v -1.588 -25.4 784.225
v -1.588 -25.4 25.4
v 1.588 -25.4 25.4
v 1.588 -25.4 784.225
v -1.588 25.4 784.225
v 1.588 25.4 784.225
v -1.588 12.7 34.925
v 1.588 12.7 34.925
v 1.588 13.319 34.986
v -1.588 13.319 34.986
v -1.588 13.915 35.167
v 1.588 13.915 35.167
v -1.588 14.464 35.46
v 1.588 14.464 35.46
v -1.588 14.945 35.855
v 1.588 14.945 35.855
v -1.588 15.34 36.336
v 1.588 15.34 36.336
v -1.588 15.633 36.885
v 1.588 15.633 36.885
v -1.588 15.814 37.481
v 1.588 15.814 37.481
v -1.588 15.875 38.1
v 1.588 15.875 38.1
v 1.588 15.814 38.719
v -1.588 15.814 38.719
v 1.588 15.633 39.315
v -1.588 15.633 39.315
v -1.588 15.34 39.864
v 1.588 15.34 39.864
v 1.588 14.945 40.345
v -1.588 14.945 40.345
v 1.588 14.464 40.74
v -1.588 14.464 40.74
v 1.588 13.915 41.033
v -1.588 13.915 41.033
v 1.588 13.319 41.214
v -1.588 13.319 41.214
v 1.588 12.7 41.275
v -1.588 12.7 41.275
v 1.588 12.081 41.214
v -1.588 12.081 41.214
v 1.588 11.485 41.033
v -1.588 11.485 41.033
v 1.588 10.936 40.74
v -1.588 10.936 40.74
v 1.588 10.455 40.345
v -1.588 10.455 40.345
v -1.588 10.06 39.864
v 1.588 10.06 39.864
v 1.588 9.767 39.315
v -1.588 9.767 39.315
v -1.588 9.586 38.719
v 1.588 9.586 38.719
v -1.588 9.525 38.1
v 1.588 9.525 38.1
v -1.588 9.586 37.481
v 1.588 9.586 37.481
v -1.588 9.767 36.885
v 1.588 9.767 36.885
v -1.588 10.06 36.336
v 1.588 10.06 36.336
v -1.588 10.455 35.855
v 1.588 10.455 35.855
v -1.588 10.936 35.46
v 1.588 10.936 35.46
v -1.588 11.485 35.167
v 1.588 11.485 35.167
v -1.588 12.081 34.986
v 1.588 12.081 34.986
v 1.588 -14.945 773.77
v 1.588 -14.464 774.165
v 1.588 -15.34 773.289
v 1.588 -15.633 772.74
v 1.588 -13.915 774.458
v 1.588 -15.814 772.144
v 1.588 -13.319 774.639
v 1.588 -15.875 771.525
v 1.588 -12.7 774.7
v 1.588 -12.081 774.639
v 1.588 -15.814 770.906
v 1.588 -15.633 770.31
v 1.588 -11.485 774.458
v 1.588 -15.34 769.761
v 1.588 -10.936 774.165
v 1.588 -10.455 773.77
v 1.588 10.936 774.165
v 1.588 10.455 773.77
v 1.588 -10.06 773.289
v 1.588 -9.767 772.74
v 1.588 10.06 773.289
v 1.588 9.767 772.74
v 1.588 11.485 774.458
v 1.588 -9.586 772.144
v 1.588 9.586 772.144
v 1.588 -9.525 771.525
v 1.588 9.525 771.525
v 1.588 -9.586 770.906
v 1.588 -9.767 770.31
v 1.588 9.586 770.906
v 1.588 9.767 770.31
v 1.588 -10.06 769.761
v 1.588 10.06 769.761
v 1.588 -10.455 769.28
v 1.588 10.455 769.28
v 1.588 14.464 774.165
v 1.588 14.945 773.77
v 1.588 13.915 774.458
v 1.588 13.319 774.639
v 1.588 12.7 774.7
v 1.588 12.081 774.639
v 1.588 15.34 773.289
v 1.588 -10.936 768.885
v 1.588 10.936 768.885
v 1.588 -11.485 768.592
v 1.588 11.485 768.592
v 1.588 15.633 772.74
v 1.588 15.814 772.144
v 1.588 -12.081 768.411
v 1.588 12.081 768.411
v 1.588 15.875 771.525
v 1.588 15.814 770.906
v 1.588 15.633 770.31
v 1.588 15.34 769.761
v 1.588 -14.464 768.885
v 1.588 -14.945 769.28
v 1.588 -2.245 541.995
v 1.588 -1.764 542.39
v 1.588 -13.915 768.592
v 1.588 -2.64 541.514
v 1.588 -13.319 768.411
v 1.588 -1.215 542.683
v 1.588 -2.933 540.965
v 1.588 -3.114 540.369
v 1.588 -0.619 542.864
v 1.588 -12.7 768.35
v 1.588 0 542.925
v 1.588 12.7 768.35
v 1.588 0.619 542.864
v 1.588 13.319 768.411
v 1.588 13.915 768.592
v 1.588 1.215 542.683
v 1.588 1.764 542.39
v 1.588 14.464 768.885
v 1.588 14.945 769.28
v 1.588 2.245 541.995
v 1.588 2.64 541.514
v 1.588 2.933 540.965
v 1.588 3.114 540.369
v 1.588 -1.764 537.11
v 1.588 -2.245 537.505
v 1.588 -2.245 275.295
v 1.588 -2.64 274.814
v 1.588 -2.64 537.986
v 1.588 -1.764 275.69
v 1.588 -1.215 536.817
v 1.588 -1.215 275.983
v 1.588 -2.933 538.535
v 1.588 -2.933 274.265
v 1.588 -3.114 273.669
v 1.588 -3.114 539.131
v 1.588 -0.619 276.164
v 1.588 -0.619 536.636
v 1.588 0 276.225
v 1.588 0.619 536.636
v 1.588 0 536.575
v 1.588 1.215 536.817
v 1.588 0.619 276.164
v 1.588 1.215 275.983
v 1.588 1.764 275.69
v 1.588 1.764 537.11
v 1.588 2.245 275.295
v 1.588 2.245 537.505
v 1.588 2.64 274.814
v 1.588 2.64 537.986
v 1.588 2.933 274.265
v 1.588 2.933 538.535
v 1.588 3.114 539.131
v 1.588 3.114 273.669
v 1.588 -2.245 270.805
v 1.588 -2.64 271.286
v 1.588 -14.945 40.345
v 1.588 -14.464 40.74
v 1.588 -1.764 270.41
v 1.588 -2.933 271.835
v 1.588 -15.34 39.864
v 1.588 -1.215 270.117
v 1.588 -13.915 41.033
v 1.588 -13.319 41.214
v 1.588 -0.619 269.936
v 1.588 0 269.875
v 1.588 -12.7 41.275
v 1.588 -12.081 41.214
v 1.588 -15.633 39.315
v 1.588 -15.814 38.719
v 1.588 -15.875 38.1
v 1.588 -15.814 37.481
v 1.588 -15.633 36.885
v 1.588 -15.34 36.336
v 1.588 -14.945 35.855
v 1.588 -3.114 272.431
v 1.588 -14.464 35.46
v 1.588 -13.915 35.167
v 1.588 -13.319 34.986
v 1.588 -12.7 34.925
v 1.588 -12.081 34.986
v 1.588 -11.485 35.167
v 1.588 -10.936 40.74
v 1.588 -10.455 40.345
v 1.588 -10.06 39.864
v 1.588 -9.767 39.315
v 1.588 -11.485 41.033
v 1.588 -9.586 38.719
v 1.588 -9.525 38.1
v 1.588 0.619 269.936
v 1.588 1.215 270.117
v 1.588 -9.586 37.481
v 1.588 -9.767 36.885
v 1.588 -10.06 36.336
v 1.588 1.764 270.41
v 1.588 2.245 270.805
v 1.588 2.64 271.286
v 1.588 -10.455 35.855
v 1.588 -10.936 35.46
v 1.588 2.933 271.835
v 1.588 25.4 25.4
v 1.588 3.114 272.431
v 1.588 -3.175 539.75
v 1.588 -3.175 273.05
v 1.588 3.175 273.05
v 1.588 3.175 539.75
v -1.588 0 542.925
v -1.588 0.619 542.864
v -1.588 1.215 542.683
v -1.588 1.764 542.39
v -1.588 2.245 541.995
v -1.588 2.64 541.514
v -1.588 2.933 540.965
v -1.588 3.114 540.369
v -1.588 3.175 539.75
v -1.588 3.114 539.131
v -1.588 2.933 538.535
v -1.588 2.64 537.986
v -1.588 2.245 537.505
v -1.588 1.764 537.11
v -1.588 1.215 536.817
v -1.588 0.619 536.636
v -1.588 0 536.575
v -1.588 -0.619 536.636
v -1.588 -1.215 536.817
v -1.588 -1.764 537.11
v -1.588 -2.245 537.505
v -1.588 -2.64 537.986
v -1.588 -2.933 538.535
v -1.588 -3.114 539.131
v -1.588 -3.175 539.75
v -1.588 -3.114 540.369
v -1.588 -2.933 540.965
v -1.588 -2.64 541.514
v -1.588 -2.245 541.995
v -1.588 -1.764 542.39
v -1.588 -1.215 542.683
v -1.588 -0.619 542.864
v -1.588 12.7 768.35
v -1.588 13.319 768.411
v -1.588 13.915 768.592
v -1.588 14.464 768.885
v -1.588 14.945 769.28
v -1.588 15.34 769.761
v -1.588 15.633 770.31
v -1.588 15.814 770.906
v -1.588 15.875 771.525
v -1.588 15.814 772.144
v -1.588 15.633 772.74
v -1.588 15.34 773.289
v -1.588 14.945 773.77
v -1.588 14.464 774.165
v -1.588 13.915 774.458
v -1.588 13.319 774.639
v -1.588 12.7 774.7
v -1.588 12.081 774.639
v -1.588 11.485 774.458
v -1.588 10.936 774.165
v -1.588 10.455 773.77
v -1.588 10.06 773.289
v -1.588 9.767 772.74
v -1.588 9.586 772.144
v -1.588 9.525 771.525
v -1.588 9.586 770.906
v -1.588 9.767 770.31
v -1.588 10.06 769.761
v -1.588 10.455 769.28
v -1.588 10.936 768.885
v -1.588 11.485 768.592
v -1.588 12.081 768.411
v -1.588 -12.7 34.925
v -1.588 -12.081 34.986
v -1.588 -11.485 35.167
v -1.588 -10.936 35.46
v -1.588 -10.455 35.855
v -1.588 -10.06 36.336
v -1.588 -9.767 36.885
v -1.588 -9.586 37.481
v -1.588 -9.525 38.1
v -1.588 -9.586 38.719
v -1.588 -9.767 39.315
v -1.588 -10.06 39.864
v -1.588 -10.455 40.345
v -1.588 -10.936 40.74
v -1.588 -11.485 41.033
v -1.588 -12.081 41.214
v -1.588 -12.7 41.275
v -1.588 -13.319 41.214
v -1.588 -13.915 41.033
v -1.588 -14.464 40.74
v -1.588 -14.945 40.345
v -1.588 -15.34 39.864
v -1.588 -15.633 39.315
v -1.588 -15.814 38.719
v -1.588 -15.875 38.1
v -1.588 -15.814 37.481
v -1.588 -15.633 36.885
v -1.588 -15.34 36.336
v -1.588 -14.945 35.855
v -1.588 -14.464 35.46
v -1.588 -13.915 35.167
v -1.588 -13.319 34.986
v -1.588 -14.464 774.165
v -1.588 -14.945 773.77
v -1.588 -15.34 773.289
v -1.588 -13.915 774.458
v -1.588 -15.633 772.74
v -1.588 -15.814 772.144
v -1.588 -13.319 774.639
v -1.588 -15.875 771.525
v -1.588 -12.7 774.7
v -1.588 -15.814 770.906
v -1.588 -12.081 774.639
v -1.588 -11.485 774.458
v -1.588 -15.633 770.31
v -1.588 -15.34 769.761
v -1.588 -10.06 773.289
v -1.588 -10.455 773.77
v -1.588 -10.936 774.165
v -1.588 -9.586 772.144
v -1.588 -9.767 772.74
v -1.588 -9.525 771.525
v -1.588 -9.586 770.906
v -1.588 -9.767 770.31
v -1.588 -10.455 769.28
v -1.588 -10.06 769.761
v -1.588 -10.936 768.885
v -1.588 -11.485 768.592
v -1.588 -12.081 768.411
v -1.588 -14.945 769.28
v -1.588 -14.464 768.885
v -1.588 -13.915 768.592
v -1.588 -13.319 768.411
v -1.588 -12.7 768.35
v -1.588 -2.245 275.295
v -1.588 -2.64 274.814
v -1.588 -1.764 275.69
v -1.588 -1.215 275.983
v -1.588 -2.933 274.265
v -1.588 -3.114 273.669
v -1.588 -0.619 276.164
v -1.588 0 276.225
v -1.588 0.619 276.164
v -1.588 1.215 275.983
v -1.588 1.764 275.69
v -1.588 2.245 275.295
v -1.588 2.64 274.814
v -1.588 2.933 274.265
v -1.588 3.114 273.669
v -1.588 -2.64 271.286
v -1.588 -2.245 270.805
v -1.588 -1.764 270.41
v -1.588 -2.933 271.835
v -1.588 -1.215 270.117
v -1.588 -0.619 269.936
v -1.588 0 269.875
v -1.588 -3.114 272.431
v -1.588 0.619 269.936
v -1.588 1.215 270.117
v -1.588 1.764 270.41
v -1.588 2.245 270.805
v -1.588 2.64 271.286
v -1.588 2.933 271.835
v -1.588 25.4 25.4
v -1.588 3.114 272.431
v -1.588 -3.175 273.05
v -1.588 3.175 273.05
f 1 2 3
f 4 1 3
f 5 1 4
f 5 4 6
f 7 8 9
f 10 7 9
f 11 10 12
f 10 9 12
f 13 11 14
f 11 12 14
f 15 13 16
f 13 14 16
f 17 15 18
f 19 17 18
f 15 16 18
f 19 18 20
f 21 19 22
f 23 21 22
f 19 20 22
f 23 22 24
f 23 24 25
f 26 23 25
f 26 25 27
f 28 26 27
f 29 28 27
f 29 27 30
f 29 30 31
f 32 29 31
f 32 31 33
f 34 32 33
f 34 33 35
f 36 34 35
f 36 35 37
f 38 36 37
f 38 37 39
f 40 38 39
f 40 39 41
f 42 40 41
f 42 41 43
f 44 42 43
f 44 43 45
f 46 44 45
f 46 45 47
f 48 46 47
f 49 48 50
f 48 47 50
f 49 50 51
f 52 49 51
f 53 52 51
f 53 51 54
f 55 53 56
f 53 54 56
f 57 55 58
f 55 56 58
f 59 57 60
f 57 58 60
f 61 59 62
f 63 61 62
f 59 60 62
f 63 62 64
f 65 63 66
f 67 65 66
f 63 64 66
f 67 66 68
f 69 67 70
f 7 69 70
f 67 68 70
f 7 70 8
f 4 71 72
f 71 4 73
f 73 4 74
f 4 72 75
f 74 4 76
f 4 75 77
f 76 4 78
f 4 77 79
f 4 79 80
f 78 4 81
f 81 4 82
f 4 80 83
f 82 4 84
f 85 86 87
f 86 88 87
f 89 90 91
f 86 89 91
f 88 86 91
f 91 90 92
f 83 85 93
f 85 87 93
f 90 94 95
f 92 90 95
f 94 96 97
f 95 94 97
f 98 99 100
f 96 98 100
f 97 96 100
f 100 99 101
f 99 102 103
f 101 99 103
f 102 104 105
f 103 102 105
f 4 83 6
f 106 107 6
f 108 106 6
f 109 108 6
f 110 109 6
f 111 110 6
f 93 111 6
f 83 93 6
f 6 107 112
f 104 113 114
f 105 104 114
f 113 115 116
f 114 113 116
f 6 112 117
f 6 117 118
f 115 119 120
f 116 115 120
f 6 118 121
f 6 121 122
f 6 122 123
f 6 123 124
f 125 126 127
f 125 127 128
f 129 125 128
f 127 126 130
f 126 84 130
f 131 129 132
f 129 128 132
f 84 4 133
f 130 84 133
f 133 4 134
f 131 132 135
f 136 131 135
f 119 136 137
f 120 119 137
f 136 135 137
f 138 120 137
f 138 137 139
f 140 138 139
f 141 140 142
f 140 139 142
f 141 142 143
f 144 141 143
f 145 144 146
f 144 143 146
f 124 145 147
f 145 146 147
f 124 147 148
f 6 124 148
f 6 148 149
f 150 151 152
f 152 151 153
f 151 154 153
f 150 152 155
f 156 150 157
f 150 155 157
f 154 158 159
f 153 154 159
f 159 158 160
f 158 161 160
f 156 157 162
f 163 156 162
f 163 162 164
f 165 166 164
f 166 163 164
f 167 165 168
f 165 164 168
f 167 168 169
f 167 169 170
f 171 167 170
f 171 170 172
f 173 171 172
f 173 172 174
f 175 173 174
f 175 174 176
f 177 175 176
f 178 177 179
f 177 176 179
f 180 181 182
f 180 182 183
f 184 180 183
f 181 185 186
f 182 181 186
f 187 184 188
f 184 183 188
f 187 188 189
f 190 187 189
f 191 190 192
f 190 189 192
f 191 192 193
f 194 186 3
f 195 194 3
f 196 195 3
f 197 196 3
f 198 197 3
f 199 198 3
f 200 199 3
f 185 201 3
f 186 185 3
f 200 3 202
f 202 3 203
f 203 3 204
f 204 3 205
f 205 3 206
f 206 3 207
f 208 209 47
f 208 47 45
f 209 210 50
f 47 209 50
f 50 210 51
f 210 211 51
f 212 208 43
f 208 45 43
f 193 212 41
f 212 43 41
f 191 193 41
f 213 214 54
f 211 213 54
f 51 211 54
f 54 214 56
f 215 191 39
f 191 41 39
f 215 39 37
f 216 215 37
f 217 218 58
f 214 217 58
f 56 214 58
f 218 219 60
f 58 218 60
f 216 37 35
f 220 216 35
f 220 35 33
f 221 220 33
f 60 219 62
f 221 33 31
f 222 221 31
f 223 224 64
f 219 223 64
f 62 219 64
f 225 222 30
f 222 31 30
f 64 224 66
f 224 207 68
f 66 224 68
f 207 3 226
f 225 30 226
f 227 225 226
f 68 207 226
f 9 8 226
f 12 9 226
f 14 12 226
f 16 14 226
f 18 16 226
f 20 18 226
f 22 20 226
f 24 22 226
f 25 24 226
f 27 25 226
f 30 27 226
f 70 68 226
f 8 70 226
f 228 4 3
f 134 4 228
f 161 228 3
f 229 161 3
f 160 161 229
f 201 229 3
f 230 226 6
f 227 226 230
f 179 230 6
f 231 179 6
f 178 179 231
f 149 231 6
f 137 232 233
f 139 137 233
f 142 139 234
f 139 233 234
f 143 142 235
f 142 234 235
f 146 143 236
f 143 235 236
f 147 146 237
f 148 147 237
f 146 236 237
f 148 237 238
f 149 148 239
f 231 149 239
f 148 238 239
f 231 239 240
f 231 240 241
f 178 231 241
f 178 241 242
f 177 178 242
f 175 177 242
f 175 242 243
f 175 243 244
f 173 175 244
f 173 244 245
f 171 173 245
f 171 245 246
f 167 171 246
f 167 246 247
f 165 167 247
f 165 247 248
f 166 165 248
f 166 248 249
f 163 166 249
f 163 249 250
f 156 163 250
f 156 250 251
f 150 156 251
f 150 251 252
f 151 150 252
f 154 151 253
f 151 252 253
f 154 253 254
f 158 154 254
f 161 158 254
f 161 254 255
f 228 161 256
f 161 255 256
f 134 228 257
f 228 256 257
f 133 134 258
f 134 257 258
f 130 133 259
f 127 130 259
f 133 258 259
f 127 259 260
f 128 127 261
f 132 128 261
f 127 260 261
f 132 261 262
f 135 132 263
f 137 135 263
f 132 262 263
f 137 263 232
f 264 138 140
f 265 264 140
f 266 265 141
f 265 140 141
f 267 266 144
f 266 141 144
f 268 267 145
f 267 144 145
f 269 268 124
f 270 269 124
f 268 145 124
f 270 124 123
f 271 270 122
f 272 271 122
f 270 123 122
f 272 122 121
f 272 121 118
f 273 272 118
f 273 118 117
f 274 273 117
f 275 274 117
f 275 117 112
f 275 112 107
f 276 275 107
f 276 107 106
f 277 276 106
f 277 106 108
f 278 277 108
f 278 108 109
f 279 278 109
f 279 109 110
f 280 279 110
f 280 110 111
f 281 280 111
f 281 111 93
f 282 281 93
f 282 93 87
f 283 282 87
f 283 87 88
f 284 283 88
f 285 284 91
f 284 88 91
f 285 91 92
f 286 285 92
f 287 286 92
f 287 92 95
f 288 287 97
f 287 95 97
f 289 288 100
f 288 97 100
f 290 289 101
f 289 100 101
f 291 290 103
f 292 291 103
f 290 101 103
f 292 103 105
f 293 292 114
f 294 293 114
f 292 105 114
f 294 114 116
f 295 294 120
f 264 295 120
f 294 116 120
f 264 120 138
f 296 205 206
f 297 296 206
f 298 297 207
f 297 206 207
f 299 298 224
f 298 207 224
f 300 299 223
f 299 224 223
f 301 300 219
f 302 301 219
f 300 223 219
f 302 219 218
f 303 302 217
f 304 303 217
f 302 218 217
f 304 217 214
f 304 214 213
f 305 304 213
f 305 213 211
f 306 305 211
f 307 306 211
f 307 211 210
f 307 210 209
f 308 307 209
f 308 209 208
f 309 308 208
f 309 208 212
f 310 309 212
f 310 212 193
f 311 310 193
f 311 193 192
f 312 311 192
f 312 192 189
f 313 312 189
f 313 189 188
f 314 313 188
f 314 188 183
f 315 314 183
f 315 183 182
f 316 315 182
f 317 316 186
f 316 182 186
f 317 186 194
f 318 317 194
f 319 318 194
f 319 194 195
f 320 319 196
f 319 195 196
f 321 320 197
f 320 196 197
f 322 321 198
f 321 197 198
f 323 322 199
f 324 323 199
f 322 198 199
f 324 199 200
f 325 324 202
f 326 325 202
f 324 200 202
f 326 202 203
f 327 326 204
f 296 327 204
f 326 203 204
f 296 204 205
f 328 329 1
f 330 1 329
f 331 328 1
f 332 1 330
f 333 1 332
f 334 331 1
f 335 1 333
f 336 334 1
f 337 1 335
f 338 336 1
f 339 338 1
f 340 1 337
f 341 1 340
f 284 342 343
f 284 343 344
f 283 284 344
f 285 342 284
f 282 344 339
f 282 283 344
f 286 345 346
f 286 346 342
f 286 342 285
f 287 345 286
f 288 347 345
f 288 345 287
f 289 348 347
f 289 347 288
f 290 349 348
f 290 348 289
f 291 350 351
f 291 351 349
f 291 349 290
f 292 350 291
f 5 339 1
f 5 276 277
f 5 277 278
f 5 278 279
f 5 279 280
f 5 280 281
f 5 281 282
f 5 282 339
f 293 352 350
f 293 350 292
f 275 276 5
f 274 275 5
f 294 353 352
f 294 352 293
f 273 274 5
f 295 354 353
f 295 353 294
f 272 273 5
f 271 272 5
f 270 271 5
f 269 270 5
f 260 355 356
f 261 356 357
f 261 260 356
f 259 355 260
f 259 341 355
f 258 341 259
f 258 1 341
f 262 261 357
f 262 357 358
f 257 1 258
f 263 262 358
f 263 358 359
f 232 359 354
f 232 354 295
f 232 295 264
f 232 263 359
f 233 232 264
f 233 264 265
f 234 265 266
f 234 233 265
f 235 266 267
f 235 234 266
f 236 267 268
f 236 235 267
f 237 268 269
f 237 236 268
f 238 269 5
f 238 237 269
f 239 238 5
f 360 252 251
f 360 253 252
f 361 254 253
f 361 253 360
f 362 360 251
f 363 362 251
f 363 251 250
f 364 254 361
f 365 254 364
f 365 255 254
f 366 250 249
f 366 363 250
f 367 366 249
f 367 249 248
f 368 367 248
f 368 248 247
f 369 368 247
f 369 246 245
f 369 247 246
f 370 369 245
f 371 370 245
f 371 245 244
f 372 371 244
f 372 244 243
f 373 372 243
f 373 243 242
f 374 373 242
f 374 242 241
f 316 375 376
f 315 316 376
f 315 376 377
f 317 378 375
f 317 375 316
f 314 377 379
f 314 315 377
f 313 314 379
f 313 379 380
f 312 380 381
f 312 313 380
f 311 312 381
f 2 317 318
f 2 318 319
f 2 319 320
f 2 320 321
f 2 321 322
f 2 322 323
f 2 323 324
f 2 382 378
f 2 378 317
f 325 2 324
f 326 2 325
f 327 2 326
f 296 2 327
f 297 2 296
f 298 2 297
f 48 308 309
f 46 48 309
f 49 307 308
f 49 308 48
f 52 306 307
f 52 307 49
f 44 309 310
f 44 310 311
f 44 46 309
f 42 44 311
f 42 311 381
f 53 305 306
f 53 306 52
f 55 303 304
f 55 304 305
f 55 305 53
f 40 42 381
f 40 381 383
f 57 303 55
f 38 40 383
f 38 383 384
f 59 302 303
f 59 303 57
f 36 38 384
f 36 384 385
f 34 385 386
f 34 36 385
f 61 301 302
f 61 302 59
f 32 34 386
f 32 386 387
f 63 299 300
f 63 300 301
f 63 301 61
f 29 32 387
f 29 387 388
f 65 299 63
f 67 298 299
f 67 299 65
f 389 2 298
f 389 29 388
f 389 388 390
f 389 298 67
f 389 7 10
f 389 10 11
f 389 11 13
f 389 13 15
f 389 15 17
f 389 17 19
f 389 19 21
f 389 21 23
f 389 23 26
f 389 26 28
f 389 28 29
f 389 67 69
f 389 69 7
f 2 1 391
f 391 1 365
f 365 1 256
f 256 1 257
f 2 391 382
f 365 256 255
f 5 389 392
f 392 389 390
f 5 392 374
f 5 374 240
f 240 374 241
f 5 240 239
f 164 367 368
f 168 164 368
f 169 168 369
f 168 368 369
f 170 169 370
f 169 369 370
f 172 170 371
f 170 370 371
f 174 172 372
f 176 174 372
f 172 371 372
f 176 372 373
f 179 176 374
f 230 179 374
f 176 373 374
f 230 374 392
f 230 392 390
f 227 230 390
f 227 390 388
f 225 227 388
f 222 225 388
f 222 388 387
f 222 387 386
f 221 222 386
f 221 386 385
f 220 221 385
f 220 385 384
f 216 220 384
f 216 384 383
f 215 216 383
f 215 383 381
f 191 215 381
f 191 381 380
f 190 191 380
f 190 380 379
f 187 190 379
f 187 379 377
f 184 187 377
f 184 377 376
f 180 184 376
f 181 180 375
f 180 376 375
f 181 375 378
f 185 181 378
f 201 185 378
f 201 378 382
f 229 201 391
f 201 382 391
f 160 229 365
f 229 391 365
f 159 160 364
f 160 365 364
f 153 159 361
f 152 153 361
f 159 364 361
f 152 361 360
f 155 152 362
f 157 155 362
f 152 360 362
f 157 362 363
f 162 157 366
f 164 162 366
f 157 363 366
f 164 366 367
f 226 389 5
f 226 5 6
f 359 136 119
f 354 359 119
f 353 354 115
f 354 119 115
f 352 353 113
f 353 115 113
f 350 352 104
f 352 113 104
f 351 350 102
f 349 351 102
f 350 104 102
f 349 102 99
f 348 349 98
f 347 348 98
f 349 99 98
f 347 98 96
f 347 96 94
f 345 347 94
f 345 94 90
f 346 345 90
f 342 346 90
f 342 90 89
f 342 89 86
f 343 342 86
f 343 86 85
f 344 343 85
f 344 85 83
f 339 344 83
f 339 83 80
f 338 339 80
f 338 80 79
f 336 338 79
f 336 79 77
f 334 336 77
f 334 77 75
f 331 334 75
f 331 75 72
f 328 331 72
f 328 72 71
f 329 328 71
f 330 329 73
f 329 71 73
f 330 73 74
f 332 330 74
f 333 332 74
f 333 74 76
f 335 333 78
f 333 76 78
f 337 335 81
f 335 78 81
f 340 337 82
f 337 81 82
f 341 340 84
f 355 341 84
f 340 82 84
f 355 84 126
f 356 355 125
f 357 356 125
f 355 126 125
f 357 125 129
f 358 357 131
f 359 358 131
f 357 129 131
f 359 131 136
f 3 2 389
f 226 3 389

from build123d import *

# Parameters (mm, degrees)
SKETCH1_W           = 3.175
SKETCH1_H           = 50.8
BOSS_EXTRUDE1_DEPTH = 809.625
SKETCH2_R           = 3.175
CUT_EXTRUDE1_DEPTH  = 4.175
SKETCH3_W           = 25.4
SKETCH3_H           = 50.8
CUT_EXTRUDE2_DEPTH  = 4.175
SKETCH4_R           = 3.175
CUT_EXTRUDE3_DEPTH  = 4.175


with BuildPart() as part:
    # Sketch1 → Boss-Extrude1 (new body)
    with BuildSketch(Plane.XY):
        Rectangle(SKETCH1_W, SKETCH1_H)
    extrude(amount=BOSS_EXTRUDE1_DEPTH)

    # Sketch2 → Cut-Extrude1 (cut, through all)
    with BuildSketch(Plane(origin=(1.5875, 0, 0), x_dir=(0, 0, -1), z_dir=(1, 0, 0))):
        with Locations((-38.1, 12.7)):
            Circle(SKETCH2_R)
        with Locations((-38.1, -12.7)):
            Circle(SKETCH2_R)
        with Locations((-771.525, 12.7)):
            Circle(SKETCH2_R)
        with Locations((-771.525, -12.7)):
            Circle(SKETCH2_R)
    extrude(amount=-CUT_EXTRUDE1_DEPTH, mode=Mode.SUBTRACT)

    # Sketch3 → Cut-Extrude2 (cut, through all)
    with BuildSketch(Plane.ZY.offset(1.5875)):
        with Locations((796.925, 0)):
            Rectangle(SKETCH3_W, SKETCH3_H)
        with Locations((12.7, 0)):
            Rectangle(SKETCH3_W, SKETCH3_H)
    extrude(amount=-CUT_EXTRUDE2_DEPTH, mode=Mode.SUBTRACT)

    # Sketch4 → Cut-Extrude3 (cut, through all)
    with BuildSketch(Plane.ZY.offset(1.5875)):
        with Locations((273.05, 0)):
            Circle(SKETCH4_R)
        with Locations((539.75, 0)):
            Circle(SKETCH4_R)
    extrude(amount=-CUT_EXTRUDE3_DEPTH, mode=Mode.SUBTRACT)


solid = part.part
